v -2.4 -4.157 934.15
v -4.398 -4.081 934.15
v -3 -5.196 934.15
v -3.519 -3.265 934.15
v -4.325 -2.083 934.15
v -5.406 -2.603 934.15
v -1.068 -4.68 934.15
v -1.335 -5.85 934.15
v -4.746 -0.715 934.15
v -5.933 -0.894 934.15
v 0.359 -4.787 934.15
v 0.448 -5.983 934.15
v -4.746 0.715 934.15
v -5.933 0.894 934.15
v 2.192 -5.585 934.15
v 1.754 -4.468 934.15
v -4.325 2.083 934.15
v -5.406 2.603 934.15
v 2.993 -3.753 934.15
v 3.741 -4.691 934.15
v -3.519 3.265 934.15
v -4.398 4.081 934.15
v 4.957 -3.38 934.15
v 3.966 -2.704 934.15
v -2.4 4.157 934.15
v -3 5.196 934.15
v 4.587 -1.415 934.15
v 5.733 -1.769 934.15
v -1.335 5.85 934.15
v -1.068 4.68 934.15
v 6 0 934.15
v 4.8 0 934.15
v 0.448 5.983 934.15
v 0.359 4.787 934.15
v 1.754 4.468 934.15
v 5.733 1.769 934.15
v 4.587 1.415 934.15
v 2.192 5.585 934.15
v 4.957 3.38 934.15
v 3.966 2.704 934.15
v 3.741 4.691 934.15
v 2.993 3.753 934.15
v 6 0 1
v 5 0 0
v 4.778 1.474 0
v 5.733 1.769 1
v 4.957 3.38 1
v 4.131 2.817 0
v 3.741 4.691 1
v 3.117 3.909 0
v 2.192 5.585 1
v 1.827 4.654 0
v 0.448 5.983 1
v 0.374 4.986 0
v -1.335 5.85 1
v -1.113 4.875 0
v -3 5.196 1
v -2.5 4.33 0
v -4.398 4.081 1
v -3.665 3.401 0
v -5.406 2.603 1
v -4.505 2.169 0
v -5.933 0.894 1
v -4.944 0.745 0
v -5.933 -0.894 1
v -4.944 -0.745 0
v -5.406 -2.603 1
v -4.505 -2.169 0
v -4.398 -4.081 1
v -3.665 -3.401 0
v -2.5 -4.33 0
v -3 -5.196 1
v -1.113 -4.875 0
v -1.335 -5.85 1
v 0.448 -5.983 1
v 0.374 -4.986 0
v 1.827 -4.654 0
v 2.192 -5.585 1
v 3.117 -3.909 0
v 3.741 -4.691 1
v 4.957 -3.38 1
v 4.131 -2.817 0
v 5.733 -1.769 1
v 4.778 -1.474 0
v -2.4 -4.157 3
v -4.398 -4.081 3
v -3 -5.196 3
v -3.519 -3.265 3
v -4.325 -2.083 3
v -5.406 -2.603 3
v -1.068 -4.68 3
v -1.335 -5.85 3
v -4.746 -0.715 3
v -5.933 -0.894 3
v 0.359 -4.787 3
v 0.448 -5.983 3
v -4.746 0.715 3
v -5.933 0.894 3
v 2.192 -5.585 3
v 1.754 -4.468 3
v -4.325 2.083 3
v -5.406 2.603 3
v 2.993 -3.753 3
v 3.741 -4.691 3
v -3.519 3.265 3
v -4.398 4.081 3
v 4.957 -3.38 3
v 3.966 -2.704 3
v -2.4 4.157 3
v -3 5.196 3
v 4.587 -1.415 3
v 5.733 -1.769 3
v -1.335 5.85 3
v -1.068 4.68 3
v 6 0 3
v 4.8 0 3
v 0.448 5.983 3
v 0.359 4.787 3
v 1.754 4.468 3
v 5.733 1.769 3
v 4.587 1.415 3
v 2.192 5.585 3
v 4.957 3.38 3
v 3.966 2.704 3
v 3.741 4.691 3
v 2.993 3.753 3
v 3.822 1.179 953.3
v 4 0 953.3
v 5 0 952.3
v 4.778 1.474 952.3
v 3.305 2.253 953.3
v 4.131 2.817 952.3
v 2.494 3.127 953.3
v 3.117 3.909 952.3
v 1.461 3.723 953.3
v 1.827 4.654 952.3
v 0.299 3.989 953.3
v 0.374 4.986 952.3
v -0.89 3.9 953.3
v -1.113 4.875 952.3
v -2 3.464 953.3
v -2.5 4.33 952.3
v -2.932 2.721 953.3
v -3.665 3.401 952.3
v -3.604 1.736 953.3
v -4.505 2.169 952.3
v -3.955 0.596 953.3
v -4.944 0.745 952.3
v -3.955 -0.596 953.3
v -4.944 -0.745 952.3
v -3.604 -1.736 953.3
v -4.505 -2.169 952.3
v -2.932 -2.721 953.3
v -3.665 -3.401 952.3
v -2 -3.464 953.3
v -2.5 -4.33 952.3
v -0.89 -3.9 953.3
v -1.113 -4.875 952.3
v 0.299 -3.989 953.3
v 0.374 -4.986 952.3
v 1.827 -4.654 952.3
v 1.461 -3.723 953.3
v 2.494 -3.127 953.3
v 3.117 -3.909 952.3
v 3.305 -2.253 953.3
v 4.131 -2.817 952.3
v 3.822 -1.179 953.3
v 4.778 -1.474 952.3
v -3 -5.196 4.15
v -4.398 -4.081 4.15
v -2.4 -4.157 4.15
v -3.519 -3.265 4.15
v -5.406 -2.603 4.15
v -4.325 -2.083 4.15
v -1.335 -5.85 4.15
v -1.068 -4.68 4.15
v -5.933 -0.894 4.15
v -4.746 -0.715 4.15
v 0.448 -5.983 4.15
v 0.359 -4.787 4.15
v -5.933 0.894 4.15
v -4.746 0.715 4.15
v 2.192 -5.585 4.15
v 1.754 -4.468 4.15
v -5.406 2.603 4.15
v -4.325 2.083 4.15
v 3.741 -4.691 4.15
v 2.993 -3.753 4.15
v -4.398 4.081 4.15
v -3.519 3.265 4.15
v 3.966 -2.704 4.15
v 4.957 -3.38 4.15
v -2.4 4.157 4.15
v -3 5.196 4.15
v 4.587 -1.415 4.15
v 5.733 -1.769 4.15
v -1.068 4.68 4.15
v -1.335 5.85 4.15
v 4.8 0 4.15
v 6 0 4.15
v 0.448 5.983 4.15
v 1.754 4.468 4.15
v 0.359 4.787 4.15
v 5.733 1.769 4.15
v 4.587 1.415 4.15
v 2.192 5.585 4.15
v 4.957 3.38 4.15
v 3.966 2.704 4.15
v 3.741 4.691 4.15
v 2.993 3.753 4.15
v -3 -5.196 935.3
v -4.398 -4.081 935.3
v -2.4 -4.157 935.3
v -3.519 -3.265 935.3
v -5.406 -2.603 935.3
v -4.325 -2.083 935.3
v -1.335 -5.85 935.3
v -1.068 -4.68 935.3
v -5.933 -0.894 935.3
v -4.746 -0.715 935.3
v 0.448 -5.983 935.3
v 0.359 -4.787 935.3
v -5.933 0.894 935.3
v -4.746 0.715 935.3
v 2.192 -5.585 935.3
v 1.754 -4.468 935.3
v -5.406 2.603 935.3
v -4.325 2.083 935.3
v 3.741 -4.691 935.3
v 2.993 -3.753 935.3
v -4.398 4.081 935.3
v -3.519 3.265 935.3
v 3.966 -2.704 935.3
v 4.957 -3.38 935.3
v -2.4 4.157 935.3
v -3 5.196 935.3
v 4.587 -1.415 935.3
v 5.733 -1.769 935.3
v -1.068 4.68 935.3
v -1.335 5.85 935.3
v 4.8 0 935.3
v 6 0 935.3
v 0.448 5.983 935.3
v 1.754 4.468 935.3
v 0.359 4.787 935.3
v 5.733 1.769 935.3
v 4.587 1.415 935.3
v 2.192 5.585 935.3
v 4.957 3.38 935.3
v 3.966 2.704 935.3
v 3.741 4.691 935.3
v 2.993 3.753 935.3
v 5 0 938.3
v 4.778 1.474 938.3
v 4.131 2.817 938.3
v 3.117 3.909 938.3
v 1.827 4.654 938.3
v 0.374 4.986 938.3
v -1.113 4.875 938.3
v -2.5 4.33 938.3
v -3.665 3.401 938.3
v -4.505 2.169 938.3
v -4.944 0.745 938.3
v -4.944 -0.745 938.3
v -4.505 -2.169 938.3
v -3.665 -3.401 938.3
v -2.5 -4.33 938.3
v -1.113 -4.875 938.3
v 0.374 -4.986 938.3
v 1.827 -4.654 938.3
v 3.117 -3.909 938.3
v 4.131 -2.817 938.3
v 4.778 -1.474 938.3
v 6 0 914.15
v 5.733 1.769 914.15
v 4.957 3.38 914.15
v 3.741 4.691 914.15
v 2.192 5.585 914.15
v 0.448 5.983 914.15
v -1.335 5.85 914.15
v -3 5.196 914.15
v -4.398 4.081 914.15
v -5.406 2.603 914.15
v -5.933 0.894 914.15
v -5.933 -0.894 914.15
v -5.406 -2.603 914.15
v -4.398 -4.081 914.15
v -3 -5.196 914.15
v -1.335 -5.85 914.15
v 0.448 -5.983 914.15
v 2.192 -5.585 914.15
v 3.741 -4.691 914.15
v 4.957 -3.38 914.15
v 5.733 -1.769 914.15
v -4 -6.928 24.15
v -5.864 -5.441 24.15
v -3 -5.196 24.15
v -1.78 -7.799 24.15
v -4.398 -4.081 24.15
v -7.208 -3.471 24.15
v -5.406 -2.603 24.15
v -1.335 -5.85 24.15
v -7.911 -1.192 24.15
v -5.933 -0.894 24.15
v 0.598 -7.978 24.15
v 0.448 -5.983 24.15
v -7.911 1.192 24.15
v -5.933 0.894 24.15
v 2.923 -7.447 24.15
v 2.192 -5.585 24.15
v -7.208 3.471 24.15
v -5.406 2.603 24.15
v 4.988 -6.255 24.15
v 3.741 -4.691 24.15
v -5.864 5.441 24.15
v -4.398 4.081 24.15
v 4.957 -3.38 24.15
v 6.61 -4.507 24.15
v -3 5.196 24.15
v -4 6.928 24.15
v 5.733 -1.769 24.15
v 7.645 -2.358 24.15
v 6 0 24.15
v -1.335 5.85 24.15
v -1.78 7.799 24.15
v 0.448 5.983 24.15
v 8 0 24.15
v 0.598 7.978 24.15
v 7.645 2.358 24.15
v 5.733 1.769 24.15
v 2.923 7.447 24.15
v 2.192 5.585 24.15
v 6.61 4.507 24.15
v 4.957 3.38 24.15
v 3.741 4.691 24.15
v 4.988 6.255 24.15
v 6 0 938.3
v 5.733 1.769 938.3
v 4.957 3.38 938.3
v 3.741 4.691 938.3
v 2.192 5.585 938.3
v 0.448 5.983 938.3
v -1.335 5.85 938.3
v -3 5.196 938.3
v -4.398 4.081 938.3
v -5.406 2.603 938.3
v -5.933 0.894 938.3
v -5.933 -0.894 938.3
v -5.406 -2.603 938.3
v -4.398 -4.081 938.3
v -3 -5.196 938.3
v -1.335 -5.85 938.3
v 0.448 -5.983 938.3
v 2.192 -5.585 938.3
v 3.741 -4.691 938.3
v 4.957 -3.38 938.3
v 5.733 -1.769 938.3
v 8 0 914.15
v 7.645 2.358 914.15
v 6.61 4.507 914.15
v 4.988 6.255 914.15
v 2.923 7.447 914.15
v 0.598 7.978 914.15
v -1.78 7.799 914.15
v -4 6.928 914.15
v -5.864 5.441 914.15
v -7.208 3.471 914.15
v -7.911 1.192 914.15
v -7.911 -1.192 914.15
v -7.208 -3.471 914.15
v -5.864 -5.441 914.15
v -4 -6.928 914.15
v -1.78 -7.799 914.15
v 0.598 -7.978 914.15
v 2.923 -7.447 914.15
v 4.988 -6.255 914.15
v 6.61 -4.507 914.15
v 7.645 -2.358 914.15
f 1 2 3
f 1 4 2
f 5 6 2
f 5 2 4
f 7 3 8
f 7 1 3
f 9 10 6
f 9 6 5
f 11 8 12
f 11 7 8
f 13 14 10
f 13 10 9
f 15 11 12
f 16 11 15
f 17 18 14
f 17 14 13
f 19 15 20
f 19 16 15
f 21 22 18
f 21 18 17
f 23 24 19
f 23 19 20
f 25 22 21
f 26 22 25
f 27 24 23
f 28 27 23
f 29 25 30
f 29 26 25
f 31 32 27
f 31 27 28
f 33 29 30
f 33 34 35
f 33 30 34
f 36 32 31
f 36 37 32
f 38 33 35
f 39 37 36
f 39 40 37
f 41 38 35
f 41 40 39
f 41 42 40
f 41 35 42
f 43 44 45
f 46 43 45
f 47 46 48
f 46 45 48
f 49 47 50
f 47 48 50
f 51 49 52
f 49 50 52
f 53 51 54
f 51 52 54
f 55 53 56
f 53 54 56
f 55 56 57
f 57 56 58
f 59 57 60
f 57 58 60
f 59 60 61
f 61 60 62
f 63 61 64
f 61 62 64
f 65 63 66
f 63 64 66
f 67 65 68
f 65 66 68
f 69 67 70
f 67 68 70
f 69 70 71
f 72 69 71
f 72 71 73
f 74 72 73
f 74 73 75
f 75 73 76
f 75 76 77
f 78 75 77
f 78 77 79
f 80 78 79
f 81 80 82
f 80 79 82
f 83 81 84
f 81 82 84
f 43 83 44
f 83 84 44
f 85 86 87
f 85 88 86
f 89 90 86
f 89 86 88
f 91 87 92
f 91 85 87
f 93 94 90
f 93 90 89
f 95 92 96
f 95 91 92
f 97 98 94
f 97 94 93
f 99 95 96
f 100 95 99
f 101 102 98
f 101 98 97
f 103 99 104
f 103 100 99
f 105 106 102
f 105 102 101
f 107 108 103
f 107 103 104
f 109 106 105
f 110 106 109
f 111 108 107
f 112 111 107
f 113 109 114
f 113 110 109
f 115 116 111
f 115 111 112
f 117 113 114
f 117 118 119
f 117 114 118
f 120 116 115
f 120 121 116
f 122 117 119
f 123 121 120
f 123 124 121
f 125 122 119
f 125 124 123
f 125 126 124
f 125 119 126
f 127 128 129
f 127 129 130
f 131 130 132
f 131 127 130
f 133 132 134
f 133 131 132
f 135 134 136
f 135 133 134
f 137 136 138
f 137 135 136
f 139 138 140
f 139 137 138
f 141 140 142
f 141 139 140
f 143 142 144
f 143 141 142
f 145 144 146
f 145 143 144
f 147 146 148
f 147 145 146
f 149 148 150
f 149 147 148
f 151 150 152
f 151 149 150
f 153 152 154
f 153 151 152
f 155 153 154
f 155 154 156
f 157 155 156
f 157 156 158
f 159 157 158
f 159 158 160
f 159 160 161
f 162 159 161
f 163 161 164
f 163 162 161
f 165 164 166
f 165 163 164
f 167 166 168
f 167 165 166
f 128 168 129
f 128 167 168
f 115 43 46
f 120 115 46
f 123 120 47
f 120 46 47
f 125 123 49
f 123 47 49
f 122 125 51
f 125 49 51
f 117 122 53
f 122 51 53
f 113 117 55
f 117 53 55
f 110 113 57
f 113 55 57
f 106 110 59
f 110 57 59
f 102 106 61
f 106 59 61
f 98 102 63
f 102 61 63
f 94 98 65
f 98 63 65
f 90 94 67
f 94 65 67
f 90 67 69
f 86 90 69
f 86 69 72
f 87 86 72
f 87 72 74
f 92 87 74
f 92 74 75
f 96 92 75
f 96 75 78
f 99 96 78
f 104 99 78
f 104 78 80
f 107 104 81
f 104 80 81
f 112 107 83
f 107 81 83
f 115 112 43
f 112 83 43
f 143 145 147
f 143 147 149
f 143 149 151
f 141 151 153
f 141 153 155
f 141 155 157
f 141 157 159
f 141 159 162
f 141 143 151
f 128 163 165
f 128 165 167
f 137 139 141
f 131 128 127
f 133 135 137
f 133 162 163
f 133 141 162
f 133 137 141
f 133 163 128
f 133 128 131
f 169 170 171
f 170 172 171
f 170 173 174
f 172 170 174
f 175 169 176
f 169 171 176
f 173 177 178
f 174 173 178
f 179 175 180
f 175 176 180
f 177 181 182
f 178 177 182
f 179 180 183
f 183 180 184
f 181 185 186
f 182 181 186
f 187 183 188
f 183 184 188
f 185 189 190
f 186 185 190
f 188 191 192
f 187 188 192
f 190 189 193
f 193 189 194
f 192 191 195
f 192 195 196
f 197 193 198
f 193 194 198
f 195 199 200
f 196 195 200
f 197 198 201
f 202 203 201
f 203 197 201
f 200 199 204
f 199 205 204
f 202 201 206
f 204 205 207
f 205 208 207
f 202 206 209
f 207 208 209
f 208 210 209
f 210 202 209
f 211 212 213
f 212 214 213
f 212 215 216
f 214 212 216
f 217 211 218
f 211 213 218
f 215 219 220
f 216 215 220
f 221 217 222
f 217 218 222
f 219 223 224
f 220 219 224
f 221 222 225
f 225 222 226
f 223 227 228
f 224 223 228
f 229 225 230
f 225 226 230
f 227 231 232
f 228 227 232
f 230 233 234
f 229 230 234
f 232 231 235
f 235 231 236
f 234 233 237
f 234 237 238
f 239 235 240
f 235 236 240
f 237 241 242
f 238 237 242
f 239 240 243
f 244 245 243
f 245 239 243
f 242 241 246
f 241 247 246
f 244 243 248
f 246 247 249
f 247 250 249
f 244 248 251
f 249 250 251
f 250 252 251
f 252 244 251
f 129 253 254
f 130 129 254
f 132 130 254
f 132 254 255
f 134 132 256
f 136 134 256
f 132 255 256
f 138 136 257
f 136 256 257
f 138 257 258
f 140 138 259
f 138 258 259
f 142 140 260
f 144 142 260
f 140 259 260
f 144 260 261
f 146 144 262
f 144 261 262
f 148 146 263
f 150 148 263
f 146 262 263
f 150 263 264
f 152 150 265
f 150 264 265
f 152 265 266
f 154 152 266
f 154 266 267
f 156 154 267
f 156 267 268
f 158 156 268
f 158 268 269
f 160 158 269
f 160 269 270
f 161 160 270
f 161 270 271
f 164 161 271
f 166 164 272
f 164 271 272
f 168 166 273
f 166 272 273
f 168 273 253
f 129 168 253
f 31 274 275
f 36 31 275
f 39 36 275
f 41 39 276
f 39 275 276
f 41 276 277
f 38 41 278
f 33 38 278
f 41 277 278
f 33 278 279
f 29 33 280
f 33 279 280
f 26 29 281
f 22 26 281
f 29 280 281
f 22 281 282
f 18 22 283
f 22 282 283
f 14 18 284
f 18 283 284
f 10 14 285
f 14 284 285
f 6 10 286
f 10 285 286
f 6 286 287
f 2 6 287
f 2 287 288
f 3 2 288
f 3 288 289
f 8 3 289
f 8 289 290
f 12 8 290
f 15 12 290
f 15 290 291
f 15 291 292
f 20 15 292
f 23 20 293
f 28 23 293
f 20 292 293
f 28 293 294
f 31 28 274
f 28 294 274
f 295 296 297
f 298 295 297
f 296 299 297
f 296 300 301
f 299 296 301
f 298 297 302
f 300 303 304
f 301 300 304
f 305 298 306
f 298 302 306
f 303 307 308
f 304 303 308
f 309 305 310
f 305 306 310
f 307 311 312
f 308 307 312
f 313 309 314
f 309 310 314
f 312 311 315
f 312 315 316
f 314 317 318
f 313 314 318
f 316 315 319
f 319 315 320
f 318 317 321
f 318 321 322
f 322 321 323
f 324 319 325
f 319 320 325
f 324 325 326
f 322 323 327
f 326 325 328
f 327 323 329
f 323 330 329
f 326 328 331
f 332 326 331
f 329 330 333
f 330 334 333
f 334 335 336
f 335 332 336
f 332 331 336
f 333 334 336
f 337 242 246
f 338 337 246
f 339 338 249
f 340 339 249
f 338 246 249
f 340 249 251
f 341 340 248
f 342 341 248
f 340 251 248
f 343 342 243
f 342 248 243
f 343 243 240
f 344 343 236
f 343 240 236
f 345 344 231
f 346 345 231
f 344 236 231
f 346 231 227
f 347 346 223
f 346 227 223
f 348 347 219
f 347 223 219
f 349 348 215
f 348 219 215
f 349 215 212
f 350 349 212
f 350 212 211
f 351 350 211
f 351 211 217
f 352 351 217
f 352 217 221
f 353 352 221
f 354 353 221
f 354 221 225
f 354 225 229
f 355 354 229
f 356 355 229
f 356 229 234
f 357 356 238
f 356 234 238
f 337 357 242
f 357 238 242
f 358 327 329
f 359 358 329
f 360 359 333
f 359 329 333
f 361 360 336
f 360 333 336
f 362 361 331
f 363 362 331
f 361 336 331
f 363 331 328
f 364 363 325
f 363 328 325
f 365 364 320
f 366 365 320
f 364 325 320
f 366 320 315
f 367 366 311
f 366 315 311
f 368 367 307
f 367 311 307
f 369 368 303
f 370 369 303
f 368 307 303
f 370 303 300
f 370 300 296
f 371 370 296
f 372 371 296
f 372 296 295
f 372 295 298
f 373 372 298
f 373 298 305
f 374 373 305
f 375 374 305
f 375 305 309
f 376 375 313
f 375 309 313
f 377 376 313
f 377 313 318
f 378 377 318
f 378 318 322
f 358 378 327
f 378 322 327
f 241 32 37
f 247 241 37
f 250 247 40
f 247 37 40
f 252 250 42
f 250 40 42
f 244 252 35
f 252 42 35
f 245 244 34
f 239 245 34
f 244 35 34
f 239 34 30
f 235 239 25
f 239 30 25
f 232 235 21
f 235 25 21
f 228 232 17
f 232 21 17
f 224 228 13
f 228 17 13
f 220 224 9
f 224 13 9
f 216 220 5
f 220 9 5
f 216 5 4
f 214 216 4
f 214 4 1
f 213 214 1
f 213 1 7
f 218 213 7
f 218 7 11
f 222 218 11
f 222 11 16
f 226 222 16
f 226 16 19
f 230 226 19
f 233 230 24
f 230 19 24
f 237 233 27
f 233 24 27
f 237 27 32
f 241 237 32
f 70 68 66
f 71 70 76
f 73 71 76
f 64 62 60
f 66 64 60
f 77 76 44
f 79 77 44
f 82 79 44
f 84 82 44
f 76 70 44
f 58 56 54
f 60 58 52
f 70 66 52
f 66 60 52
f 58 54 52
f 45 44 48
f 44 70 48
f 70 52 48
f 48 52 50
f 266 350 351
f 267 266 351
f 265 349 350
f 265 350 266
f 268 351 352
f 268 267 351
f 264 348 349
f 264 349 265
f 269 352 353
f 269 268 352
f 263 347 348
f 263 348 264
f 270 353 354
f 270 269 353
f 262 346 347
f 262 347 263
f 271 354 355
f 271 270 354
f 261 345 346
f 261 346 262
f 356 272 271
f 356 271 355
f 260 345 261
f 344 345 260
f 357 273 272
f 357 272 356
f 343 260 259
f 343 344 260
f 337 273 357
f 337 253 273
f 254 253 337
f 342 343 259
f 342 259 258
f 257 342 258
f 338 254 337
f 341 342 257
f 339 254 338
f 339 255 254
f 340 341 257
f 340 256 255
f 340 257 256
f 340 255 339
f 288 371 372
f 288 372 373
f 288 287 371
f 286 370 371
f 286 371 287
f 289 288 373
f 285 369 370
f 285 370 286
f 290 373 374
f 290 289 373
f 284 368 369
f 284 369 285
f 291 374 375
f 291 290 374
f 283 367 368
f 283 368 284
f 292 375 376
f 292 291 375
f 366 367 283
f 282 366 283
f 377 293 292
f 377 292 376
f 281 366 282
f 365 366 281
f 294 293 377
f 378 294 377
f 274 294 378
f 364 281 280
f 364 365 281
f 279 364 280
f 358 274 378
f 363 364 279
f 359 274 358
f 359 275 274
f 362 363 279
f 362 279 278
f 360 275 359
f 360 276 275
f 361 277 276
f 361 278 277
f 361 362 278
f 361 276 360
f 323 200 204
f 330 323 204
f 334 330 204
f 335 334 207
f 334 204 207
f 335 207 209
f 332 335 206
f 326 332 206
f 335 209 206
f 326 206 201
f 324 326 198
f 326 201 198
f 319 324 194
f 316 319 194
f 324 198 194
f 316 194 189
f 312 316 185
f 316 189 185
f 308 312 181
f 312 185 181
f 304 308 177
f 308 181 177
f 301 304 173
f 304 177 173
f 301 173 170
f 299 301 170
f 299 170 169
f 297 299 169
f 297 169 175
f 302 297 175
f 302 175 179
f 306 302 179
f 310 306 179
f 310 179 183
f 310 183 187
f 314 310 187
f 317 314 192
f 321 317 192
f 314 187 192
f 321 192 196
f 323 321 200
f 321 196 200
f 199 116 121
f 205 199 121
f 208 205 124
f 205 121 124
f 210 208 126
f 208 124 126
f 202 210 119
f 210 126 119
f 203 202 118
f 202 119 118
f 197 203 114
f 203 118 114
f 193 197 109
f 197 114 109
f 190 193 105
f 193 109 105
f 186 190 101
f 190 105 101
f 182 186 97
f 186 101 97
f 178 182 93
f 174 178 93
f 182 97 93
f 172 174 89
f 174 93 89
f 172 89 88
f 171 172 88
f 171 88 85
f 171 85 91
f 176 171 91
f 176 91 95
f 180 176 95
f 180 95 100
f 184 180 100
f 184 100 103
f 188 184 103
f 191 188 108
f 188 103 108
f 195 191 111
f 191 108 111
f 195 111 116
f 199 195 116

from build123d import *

# Parameters (mm, degrees)
F0_R      = 6
F1_DEPTH  = 3
F2_R      = 4.8
F3_DEPTH  = 1.15
F4_R      = 6
F4_R_2    = 4.8
F5_DEPTH  = 20
F6_R      = 8
F6_R_2    = 6
F7_DEPTH  = 890
F8_R      = 6
F9_DEPTH  = 20
F10_R     = 4.8
F11_DEPTH = 1.15
F12_R     = 6
F12_R_2   = 4.8
F13_DEPTH = 3
F14_R     = 5
F15_DEPTH = 15
F16_SIZE  = 1


with BuildPart() as f1:
    # F0 (on Top) → F1 (new body)
    with BuildSketch(Plane.XY):
        Circle(F0_R)
    extrude(amount=F1_DEPTH)

    # F2 (on face) → F3 (join)
    with BuildSketch(Plane.XY.offset(3)):
        Circle(F2_R)
    extrude(amount=F3_DEPTH)

    # F4 (on face) → F5 (join)
    with BuildSketch(Plane.XY.offset(4.15)):
        Circle(F4_R)
        Circle(F4_R_2, mode=Mode.SUBTRACT)
        Circle(F4_R_2)
    extrude(amount=F5_DEPTH)

    # F6 (on face) → F7 (join)
    with BuildSketch(Plane.XY.offset(24.15)):
        Circle(F6_R)
        Circle(F6_R_2, mode=Mode.SUBTRACT)
        Circle(F6_R_2)
    extrude(amount=F7_DEPTH)

    # F8 (on face) → F9 (join)
    with BuildSketch(Plane.XY.offset(914.15)):
        Circle(F8_R)
    extrude(amount=F9_DEPTH)

    # F10 (on face) → F11 (join)
    with BuildSketch(Plane.XY.offset(934.15)):
        Circle(F10_R)
    extrude(amount=F11_DEPTH)

    # F12 (on face) → F13 (join)
    with BuildSketch(Plane.XY.offset(935.3)):
        Circle(F12_R)
        Circle(F12_R_2, mode=Mode.SUBTRACT)
        Circle(F12_R_2)
    extrude(amount=F13_DEPTH)

    # F14 (on face) → F15 (join)
    with BuildSketch(Plane.XY.offset(938.3)):
        Circle(F14_R)
    extrude(amount=F15_DEPTH)

    # F16
    f16_edges = [f1.edges().sort_by_distance(p)[0] for p in [
        (-5, 0, 953.3),
        (-6, 0, 0),
    ]]
    chamfer(f16_edges, length=F16_SIZE)


solid = f1.part
